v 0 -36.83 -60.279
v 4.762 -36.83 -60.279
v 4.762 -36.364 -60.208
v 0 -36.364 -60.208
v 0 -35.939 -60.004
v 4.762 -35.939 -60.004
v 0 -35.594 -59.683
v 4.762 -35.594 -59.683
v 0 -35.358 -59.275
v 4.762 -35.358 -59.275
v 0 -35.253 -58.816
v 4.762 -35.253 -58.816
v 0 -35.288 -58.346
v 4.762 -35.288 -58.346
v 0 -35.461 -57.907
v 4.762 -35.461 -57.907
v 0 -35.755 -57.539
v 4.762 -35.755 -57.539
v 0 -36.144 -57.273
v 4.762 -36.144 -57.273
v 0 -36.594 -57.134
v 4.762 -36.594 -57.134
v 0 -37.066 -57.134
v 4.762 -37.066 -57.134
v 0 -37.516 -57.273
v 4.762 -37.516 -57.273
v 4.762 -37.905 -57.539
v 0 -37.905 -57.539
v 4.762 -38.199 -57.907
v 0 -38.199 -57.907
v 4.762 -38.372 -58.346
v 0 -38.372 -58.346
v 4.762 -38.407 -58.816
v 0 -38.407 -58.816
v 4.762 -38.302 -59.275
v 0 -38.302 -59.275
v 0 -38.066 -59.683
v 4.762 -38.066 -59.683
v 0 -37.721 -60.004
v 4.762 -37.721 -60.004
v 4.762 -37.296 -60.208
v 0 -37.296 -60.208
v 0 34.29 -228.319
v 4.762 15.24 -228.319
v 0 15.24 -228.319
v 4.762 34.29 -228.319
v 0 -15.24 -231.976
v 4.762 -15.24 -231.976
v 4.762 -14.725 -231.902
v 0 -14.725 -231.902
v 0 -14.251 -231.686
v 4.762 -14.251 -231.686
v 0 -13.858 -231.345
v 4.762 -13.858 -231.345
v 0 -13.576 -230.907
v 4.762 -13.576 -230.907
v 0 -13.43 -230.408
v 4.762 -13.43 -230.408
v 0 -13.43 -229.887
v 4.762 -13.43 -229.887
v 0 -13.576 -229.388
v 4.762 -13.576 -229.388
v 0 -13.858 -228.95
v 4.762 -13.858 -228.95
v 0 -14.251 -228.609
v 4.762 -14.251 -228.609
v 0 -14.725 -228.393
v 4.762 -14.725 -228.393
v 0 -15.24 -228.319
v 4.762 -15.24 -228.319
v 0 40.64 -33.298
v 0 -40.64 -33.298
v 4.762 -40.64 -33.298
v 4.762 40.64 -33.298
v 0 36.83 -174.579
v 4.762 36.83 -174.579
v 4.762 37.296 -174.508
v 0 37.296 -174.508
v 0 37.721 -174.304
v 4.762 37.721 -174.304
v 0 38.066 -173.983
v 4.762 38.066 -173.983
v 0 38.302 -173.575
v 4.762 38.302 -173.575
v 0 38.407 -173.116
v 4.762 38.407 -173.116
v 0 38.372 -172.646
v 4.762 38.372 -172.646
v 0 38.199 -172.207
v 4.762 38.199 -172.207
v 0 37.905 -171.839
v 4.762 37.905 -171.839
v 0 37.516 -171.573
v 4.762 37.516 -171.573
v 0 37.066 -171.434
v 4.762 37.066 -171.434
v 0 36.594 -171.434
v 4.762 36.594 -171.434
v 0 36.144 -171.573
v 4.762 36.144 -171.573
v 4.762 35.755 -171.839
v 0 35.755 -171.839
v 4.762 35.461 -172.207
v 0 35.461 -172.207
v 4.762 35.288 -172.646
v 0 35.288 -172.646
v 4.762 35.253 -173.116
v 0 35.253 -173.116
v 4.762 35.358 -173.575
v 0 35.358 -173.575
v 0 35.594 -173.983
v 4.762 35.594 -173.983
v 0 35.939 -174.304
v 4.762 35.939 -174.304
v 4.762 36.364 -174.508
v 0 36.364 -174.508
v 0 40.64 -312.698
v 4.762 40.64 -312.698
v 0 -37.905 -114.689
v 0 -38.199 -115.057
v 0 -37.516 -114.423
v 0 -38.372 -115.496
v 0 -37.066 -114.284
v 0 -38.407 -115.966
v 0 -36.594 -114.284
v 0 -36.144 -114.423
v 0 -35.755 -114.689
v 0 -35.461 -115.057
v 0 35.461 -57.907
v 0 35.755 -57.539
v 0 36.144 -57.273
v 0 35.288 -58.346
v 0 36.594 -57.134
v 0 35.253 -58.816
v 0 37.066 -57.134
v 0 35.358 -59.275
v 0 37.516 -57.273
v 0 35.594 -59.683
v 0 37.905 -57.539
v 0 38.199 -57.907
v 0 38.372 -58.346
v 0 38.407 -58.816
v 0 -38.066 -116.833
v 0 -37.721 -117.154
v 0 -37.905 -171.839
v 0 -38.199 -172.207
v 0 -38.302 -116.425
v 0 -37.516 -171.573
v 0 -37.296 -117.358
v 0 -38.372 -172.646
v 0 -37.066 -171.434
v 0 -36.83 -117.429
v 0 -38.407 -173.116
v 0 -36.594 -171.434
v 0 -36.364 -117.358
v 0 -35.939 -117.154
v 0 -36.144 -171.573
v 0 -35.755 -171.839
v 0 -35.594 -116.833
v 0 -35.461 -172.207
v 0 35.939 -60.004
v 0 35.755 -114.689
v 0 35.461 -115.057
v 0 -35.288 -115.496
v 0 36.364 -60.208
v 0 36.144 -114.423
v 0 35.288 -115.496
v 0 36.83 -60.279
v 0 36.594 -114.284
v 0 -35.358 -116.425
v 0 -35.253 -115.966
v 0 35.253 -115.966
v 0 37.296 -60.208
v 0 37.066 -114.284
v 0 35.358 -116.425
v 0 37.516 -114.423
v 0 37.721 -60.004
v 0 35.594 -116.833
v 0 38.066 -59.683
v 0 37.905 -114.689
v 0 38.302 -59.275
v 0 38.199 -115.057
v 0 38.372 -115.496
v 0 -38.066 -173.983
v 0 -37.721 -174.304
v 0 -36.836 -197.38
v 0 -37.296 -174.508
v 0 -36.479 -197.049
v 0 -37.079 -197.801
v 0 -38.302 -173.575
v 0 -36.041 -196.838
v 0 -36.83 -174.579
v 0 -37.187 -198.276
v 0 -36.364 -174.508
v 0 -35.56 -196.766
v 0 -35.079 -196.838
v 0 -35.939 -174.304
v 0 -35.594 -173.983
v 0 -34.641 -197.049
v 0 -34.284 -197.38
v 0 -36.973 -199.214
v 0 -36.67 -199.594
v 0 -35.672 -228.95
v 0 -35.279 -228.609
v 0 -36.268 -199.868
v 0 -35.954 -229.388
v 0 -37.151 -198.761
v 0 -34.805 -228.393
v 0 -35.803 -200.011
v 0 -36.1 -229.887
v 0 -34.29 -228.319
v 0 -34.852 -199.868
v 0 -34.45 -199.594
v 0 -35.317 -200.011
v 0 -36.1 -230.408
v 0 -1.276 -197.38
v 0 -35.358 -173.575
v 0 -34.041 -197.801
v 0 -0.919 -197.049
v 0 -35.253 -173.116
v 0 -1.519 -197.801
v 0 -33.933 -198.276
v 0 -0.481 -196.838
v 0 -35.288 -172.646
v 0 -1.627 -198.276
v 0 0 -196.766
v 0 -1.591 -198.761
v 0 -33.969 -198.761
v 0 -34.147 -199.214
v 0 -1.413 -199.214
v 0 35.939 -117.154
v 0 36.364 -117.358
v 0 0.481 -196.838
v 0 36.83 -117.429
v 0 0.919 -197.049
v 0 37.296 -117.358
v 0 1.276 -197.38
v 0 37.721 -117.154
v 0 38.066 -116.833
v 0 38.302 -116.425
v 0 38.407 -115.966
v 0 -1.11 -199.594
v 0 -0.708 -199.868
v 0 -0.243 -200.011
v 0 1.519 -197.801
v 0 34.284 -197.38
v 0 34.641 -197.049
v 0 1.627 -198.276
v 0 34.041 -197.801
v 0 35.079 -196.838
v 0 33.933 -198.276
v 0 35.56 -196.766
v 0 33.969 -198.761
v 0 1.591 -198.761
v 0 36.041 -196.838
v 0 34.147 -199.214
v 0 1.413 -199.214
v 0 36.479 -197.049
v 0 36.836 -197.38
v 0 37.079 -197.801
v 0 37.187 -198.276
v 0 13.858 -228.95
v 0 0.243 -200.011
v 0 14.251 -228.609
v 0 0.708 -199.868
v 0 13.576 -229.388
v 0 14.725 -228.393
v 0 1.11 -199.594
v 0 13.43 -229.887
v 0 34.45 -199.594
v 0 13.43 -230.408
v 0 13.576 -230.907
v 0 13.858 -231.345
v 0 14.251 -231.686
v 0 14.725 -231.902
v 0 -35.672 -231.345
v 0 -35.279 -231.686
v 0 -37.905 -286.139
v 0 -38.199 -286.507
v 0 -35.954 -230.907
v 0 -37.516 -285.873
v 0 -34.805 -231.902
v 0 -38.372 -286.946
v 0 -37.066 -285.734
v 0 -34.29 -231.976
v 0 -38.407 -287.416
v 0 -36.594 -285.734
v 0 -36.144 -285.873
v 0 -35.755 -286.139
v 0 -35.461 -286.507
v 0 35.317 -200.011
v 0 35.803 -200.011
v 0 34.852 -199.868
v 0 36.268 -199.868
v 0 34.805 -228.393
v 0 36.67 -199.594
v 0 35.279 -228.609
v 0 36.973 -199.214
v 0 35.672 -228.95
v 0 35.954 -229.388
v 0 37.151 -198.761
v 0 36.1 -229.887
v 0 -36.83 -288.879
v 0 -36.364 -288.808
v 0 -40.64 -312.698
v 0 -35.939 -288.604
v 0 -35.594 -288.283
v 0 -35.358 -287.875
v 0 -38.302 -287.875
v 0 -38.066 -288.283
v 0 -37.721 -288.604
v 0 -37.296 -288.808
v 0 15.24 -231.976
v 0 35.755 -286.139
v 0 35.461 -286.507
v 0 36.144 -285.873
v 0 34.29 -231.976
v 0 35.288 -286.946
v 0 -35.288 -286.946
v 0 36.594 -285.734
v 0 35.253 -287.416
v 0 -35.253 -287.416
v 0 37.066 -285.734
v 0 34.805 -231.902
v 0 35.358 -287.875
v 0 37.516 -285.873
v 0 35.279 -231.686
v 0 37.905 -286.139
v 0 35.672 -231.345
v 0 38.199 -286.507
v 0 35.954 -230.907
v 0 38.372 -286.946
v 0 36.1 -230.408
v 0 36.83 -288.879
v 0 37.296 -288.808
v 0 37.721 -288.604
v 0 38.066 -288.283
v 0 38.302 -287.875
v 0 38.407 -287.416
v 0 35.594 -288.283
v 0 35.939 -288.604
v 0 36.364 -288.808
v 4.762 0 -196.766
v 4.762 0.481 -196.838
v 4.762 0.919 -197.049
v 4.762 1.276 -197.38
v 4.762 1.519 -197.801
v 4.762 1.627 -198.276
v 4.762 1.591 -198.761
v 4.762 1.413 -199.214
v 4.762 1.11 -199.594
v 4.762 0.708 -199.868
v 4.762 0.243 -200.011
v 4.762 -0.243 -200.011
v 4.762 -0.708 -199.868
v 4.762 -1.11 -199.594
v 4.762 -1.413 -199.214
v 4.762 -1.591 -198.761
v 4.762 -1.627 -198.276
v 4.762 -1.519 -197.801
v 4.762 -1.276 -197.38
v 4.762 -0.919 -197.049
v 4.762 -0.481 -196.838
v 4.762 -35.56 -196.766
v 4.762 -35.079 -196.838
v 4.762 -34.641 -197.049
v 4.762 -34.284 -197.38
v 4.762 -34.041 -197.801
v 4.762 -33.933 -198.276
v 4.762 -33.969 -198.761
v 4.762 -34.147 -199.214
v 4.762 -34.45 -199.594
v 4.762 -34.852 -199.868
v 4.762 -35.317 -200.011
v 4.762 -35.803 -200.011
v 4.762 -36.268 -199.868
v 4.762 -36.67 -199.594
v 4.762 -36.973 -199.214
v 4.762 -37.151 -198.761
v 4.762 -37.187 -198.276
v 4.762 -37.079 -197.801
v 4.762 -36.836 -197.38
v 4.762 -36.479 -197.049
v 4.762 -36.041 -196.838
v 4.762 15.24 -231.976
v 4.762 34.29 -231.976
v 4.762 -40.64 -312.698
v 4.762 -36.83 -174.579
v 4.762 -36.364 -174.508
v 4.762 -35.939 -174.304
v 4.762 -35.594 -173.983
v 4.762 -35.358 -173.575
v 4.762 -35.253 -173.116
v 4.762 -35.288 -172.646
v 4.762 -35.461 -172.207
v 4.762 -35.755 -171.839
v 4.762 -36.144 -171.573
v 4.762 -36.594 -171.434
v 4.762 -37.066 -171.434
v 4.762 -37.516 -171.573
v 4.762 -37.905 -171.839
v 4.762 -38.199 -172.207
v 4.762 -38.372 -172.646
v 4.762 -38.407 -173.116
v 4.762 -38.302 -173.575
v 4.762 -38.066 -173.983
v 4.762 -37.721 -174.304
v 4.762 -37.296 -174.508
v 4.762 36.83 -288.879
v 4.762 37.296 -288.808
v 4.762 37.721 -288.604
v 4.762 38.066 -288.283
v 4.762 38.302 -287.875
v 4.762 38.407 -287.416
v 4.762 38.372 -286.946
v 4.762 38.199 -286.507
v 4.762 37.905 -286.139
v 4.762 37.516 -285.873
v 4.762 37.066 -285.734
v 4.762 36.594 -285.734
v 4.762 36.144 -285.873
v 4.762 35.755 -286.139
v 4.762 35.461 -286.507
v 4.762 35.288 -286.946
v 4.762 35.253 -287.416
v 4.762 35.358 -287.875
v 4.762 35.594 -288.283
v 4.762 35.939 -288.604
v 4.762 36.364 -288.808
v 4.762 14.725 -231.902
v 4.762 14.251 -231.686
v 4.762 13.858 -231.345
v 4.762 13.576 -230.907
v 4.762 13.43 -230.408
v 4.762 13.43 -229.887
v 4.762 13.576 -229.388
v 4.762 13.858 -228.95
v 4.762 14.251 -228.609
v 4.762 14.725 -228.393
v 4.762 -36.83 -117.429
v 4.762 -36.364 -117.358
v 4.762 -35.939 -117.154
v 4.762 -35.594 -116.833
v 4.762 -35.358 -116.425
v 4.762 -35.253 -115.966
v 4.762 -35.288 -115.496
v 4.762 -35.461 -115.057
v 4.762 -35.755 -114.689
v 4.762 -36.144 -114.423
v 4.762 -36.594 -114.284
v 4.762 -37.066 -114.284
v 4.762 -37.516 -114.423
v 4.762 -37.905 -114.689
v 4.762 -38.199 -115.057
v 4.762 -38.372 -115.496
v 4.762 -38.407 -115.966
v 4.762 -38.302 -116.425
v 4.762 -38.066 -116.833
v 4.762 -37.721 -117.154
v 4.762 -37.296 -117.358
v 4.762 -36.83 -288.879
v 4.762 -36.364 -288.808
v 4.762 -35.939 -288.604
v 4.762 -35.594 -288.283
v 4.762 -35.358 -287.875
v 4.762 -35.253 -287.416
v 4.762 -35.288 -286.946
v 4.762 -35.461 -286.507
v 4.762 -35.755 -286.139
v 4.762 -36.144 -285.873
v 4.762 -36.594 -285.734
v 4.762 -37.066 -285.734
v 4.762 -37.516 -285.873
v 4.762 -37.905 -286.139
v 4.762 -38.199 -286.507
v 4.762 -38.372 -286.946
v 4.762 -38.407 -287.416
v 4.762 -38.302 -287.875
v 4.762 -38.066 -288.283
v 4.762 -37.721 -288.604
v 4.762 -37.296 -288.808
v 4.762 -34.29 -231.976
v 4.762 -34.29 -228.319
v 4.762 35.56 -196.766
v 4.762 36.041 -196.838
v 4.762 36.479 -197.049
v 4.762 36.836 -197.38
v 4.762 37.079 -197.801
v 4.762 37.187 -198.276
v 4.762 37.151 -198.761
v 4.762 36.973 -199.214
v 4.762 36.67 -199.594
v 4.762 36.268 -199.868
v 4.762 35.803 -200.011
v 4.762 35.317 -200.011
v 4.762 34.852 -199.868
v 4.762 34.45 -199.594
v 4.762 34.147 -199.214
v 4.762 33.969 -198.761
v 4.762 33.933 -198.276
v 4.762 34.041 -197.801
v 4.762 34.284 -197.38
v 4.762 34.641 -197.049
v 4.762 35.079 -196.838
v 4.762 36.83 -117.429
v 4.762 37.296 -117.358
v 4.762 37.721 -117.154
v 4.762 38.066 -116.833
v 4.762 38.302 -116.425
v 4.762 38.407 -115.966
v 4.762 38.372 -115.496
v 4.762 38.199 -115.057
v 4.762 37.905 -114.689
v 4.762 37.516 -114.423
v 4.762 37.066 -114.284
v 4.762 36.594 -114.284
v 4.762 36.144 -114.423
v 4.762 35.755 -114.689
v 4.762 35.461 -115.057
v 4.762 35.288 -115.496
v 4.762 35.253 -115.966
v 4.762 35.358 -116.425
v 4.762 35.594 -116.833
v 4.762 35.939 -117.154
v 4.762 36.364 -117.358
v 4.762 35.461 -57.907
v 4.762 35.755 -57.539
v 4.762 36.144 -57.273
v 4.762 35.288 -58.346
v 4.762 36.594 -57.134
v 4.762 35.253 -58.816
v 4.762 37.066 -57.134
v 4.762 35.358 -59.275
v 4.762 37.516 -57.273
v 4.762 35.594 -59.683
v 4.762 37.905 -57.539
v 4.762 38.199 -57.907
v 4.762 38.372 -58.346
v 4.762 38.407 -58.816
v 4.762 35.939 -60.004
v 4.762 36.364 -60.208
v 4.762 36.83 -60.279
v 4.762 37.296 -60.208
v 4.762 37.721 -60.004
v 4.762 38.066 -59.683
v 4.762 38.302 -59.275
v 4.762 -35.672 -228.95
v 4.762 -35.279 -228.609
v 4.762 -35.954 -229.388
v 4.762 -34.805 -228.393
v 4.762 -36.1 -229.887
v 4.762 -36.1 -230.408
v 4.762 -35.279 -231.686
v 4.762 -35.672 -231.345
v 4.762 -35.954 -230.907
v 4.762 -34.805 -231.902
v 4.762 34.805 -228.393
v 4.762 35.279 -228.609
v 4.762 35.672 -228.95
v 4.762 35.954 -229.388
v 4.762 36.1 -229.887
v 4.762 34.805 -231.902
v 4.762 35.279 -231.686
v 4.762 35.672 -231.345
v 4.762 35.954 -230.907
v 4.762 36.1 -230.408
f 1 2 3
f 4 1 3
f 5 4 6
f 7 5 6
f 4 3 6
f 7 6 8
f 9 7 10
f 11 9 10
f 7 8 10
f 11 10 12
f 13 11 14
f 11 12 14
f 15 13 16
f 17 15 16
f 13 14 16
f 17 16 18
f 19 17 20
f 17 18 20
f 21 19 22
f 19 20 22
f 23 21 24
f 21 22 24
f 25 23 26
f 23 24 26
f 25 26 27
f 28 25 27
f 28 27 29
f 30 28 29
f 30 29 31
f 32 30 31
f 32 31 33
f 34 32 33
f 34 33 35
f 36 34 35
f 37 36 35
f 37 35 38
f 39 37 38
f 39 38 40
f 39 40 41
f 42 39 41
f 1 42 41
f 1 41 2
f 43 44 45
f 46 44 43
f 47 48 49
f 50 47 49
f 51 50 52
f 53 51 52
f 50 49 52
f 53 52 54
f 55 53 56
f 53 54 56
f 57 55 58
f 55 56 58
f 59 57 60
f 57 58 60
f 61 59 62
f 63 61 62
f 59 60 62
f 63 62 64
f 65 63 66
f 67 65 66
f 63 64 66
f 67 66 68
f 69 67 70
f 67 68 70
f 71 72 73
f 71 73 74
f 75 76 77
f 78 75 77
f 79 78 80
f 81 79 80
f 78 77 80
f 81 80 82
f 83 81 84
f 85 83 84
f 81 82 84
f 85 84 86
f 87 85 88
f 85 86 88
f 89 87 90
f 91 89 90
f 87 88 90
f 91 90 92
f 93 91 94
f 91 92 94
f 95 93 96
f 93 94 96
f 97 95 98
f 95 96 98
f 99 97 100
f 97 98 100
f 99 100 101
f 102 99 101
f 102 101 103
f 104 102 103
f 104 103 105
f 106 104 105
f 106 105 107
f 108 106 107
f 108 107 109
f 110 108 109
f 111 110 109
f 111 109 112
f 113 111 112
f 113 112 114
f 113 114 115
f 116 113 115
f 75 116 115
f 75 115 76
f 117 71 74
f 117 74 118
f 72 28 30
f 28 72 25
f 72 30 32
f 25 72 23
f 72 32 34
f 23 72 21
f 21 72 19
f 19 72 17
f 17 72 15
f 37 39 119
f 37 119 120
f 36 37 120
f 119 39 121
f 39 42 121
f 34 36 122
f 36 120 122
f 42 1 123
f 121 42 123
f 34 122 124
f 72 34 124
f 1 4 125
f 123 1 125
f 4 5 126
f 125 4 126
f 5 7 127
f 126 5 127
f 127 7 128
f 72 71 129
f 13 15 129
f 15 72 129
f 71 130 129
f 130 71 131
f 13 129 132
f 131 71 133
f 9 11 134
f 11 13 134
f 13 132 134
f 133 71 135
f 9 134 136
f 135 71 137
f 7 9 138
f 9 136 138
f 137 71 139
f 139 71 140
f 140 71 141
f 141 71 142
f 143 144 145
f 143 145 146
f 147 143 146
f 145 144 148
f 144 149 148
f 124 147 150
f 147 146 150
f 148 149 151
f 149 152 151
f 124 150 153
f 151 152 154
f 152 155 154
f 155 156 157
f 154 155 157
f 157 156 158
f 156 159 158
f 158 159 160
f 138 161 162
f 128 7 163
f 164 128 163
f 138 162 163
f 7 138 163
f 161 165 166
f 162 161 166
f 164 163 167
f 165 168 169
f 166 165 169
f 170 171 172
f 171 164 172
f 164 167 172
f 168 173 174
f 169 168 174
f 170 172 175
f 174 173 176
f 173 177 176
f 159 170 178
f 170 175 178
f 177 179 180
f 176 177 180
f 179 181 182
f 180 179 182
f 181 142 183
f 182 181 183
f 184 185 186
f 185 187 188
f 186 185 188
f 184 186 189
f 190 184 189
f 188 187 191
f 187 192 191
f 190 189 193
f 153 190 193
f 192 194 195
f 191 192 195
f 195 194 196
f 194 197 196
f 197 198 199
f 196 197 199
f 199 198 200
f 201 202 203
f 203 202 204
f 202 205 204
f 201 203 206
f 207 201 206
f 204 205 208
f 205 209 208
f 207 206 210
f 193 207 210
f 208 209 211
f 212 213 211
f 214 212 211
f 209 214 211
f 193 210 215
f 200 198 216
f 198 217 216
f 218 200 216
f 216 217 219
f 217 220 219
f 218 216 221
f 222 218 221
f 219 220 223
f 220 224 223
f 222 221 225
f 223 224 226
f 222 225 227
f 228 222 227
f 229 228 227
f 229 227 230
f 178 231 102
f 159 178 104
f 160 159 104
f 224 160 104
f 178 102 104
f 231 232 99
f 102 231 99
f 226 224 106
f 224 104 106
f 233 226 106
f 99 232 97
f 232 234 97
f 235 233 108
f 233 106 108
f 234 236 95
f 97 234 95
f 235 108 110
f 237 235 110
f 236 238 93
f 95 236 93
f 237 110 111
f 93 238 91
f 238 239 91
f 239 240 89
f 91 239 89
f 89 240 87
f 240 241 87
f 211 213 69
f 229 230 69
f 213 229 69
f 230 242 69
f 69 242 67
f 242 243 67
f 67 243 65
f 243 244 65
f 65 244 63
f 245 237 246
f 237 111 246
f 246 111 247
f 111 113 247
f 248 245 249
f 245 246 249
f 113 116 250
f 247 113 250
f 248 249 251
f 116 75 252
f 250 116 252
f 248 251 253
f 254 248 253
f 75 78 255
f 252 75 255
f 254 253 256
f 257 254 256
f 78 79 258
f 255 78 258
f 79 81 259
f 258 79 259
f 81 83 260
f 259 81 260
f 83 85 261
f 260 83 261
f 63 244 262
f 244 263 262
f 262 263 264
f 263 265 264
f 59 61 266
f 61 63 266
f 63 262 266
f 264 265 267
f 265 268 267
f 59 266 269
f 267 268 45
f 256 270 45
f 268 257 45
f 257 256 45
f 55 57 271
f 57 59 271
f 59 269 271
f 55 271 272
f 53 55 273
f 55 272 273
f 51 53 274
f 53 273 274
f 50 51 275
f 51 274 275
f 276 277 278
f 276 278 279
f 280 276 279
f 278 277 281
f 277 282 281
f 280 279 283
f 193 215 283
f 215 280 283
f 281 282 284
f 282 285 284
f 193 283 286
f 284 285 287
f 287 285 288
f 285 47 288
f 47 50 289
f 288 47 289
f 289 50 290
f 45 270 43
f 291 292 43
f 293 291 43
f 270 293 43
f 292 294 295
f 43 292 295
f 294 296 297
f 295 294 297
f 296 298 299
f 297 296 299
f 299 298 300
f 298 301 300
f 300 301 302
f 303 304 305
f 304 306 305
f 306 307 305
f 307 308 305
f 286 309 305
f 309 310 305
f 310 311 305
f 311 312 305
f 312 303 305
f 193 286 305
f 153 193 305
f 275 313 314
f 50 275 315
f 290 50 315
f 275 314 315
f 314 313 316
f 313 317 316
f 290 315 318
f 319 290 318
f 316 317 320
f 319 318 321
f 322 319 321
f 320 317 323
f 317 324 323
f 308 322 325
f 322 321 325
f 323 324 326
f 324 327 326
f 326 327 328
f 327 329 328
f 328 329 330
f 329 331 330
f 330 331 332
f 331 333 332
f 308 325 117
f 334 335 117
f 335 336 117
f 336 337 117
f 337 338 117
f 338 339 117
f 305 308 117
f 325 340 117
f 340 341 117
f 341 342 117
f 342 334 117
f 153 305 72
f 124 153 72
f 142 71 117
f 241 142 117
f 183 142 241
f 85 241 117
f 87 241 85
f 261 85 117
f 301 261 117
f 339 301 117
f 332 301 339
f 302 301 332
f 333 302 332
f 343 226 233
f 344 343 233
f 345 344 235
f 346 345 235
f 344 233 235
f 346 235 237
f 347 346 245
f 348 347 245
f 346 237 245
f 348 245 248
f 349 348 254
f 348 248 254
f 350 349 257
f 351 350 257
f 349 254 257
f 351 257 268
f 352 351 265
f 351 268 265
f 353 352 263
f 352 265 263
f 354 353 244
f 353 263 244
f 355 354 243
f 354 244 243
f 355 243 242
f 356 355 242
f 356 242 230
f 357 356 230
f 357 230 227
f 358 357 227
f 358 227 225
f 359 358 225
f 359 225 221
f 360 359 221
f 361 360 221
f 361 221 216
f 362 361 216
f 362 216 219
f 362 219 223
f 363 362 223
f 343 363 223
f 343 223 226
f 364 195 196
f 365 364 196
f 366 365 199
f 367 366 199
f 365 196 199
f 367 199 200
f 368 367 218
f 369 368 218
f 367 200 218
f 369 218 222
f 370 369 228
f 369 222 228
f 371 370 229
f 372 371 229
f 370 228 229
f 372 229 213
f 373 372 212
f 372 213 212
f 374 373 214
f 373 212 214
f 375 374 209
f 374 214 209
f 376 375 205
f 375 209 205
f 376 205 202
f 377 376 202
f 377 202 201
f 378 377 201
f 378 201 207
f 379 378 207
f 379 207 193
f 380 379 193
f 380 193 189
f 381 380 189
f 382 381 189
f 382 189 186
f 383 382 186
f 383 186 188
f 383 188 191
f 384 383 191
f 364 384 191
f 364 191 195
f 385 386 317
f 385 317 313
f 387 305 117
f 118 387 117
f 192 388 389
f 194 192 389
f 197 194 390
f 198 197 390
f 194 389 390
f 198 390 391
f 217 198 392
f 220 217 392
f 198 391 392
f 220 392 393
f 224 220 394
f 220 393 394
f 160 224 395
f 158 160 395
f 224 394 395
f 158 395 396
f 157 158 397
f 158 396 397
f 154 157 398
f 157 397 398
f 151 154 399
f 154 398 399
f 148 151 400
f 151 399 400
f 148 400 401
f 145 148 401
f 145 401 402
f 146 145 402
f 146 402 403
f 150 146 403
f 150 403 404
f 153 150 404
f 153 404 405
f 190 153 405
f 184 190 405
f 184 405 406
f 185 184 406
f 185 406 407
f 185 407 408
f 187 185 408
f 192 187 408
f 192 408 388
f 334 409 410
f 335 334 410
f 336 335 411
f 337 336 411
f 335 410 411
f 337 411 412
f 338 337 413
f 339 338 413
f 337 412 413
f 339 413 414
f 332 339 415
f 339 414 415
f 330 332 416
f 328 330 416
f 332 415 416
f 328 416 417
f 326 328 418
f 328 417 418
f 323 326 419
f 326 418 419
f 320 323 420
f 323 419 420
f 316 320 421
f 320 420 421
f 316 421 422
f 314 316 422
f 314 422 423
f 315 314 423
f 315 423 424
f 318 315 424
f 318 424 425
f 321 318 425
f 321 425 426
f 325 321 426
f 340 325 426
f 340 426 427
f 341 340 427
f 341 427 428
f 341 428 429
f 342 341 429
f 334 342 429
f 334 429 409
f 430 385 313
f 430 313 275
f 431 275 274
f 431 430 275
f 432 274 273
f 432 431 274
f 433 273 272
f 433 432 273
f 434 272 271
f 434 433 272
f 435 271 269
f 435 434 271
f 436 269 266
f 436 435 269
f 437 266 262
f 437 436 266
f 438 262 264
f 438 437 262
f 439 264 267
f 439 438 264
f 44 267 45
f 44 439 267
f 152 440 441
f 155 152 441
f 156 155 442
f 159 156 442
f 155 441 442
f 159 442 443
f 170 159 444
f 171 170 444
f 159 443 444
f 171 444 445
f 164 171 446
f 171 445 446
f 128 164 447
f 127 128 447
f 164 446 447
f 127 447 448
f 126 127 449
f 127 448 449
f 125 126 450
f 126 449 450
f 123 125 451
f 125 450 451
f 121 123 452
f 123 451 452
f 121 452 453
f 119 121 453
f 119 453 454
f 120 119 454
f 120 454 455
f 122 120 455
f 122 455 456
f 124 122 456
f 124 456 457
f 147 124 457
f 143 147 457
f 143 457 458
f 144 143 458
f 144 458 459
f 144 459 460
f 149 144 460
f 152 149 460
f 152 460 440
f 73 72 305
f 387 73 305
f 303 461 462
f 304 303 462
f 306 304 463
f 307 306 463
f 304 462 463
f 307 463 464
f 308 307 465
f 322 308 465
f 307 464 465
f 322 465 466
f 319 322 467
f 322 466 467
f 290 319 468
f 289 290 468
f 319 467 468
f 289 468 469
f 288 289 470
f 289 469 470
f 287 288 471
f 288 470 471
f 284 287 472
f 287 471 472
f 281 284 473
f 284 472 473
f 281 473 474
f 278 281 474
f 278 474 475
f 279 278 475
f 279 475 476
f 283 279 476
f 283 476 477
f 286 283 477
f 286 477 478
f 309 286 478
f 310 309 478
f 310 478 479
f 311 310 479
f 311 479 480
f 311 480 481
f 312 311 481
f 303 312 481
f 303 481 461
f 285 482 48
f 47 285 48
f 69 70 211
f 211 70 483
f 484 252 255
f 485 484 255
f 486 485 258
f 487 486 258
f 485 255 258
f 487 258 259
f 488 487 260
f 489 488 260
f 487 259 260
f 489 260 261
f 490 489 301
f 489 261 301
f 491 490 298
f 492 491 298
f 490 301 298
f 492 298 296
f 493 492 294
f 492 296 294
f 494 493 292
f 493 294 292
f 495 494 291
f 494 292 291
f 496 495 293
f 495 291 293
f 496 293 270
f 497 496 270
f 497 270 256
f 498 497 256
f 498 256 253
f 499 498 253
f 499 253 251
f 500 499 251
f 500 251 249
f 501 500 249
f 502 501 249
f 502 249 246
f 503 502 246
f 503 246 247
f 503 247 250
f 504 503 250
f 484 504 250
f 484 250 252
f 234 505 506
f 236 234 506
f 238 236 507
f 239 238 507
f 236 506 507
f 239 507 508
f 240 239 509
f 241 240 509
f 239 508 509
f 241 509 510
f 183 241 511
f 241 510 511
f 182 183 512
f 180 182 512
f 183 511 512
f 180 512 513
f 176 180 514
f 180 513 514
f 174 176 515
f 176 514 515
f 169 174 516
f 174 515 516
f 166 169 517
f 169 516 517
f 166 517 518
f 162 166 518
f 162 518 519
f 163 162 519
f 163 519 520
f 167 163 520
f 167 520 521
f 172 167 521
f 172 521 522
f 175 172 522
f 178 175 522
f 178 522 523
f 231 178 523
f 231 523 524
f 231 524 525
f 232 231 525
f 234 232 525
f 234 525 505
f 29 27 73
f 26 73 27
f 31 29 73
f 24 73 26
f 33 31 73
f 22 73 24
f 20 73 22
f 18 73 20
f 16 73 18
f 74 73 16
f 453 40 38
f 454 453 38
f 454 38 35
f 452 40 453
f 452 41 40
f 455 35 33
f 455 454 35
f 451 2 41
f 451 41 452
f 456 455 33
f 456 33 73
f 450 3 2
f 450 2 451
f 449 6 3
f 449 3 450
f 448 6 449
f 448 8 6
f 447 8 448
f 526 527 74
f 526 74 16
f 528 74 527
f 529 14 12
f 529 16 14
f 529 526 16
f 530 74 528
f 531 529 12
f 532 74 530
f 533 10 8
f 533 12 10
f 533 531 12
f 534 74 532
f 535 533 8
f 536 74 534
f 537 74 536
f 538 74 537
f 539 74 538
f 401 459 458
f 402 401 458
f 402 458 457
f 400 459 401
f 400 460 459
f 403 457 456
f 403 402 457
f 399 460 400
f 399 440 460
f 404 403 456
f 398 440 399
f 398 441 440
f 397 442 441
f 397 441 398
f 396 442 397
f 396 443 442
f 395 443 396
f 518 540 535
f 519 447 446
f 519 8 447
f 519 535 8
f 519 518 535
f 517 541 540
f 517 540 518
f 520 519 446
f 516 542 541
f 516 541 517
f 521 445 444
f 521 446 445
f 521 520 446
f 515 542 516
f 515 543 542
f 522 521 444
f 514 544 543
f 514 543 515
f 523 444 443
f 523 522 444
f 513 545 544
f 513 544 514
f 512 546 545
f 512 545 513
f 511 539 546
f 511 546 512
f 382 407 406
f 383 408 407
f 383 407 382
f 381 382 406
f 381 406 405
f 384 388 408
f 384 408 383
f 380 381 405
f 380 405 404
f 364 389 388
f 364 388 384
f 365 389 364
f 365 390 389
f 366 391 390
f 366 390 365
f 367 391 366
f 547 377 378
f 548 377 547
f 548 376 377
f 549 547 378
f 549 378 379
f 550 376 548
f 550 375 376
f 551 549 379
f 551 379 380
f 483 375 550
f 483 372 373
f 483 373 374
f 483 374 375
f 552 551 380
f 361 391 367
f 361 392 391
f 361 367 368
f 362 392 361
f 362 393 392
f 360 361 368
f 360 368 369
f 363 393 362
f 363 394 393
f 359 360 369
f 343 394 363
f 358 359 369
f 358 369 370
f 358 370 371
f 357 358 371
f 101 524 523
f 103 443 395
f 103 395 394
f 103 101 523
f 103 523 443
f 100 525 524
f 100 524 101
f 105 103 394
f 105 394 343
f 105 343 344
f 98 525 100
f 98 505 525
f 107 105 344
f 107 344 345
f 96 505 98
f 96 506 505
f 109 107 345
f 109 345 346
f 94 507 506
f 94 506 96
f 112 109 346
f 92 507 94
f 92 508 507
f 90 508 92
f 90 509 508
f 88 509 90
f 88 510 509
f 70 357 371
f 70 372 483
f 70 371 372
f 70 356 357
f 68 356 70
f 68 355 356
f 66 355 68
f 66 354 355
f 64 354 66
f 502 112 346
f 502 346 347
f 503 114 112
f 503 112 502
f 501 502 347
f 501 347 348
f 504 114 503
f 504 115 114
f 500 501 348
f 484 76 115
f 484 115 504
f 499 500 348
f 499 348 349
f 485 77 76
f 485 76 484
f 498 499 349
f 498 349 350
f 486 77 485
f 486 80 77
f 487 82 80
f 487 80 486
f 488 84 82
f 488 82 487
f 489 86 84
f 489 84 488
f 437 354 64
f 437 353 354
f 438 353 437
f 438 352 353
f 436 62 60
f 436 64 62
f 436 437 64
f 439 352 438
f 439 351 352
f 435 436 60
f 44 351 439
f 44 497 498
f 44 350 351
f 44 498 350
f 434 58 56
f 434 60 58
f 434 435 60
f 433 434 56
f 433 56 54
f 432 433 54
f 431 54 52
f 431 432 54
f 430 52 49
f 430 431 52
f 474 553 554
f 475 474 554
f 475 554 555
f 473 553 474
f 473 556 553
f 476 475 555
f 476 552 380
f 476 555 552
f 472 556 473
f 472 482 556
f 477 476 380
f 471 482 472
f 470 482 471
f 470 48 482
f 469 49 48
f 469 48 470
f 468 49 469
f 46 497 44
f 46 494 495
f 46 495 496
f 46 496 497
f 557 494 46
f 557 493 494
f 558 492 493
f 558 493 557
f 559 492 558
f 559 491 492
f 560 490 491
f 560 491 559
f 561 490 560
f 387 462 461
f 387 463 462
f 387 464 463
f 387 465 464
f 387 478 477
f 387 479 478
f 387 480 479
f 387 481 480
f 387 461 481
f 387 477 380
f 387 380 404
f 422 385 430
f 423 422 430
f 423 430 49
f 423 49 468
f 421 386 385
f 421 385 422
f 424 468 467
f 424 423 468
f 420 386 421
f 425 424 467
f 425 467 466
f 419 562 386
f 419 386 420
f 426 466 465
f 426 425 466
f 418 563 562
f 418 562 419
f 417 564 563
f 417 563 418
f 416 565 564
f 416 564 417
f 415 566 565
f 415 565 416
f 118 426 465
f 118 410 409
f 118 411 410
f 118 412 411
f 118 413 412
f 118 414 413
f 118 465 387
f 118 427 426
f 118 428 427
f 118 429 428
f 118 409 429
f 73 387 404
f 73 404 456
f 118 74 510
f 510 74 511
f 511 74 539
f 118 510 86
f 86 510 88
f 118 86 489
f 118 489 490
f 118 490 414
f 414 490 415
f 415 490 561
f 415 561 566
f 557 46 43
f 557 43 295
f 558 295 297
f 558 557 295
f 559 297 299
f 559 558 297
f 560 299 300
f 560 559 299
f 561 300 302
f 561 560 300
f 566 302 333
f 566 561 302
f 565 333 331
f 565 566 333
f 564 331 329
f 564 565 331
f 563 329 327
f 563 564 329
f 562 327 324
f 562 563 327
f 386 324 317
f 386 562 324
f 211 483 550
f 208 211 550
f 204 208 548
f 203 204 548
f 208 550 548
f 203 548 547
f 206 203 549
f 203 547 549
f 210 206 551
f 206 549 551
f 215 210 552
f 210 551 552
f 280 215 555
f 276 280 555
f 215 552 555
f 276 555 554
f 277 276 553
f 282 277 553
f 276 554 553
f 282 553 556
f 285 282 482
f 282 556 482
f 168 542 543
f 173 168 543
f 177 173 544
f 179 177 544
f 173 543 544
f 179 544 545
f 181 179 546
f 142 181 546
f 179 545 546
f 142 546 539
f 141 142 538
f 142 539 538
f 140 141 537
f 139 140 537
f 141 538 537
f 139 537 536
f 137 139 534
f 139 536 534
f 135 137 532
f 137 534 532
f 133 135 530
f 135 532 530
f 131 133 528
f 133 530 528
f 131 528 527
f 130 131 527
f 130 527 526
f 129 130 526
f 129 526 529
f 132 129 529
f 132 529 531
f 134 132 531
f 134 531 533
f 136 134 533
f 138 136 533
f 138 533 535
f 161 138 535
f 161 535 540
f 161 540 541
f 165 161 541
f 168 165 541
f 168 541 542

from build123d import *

# Parameters (mm, degrees)
SKETCH1_W                     = 279.4
SKETCH1_H                     = 81.28
BOSS_EXTRUDE1_DEPTH           = 4.7625
SKETCH2_R                     = 4.7625
GEARBOX_WITH_PRESS_FITS_DEPTH = 316.363404917
SKETCH3_R                     = 1.58115
CUT_EXTRUDE1_DEPTH            = 316.363404917
F_4_CLEARANCE_HOLE1_D         = 3.2639
F_4_CLEARANCE_HOLE1_DEPTH     = 4.826
F_4_CLEARANCE_HOLE1_TIP       = 0.980574487


with BuildPart() as part:
    # Sketch1 → Boss-Extrude1 (new body)
    with BuildSketch(Plane(origin=(0, 0, 0), x_dir=(0, 0, -1), z_dir=(1, 0, 0))):
        with Locations((172.997595377, 0)):
            Rectangle(SKETCH1_W, SKETCH1_H)
    extrude(amount=BOSS_EXTRUDE1_DEPTH)

    # Sketch2 → Gearbox (with Press fits) (cut, through all)
    with BuildSketch(Plane(origin=(4.7625, 0, 0), x_dir=(0, 0, -1), z_dir=(1, 0, 0))):
        with Locations((331.004197306, 10)):
            Circle(SKETCH2_R)
    extrude(amount=-GEARBOX_WITH_PRESS_FITS_DEPTH, mode=Mode.SUBTRACT)

    # Sketch3 → Cut-Extrude1 (cut, through all)
    with BuildSketch(Plane(origin=(4.7625, 0, 0), x_dir=(0, 0, -1), z_dir=(1, 0, 0))):
        with Locations((287.297595377, 36.83)):
            Circle(SKETCH3_R)
        with Locations((172.997595377, 36.83)):
            Circle(SKETCH3_R)
        with Locations((115.847595377, 36.83)):
            Circle(SKETCH3_R)
        with Locations((58.697595377, 36.83)):
            Circle(SKETCH3_R)
        with Locations((58.697595377, -36.83)):
            Circle(SKETCH3_R)
        with Locations((115.847595377, -36.83)):
            Circle(SKETCH3_R)
        with Locations((172.997595377, -36.83)):
            Circle(SKETCH3_R)
        with Locations((287.297595377, -36.83)):
            Circle(SKETCH3_R)
        with BuildLine():
            Line((231.976395377, 34.29), (231.976395377, 15.24))
            ThreePointArc((231.976395377, 15.24), (230.147595377, 13.4112), (228.318795377, 15.24))
            Line((228.318795377, 15.24), (228.318795377, 34.29))
            ThreePointArc((228.318795377, 34.29), (230.147595377, 36.1188), (231.976395377, 34.29))
        make_face()
        with BuildLine():
            Line((231.976395377, -34.29), (231.976395377, -15.24))
            ThreePointArc((231.976395377, -15.24), (230.147595377, -13.4112), (228.318795377, -15.24))
            Line((228.318795377, -15.24), (228.318795377, -34.29))
            ThreePointArc((228.318795377, -34.29), (230.147595377, -36.1188), (231.976395377, -34.29))
        make_face()
    extrude(amount=-CUT_EXTRUDE1_DEPTH, mode=Mode.SUBTRACT)

    # #4 Clearance Hole1
    with Locations(Plane(origin=(4.7625, 0, 0), x_dir=(0, 0, -1), z_dir=(1, 0, 0))):
        with Locations((198.397595377, 35.56), (198.397595377, -35.56), (198.397595377, 0)):
            Hole(F_4_CLEARANCE_HOLE1_D / 2, depth=F_4_CLEARANCE_HOLE1_DEPTH)
            with Locations((0, 0, -(F_4_CLEARANCE_HOLE1_DEPTH + F_4_CLEARANCE_HOLE1_TIP / 2))):  # 118° drill point
                Cone(0, F_4_CLEARANCE_HOLE1_D / 2, F_4_CLEARANCE_HOLE1_TIP, mode=Mode.SUBTRACT)


solid = part.part
